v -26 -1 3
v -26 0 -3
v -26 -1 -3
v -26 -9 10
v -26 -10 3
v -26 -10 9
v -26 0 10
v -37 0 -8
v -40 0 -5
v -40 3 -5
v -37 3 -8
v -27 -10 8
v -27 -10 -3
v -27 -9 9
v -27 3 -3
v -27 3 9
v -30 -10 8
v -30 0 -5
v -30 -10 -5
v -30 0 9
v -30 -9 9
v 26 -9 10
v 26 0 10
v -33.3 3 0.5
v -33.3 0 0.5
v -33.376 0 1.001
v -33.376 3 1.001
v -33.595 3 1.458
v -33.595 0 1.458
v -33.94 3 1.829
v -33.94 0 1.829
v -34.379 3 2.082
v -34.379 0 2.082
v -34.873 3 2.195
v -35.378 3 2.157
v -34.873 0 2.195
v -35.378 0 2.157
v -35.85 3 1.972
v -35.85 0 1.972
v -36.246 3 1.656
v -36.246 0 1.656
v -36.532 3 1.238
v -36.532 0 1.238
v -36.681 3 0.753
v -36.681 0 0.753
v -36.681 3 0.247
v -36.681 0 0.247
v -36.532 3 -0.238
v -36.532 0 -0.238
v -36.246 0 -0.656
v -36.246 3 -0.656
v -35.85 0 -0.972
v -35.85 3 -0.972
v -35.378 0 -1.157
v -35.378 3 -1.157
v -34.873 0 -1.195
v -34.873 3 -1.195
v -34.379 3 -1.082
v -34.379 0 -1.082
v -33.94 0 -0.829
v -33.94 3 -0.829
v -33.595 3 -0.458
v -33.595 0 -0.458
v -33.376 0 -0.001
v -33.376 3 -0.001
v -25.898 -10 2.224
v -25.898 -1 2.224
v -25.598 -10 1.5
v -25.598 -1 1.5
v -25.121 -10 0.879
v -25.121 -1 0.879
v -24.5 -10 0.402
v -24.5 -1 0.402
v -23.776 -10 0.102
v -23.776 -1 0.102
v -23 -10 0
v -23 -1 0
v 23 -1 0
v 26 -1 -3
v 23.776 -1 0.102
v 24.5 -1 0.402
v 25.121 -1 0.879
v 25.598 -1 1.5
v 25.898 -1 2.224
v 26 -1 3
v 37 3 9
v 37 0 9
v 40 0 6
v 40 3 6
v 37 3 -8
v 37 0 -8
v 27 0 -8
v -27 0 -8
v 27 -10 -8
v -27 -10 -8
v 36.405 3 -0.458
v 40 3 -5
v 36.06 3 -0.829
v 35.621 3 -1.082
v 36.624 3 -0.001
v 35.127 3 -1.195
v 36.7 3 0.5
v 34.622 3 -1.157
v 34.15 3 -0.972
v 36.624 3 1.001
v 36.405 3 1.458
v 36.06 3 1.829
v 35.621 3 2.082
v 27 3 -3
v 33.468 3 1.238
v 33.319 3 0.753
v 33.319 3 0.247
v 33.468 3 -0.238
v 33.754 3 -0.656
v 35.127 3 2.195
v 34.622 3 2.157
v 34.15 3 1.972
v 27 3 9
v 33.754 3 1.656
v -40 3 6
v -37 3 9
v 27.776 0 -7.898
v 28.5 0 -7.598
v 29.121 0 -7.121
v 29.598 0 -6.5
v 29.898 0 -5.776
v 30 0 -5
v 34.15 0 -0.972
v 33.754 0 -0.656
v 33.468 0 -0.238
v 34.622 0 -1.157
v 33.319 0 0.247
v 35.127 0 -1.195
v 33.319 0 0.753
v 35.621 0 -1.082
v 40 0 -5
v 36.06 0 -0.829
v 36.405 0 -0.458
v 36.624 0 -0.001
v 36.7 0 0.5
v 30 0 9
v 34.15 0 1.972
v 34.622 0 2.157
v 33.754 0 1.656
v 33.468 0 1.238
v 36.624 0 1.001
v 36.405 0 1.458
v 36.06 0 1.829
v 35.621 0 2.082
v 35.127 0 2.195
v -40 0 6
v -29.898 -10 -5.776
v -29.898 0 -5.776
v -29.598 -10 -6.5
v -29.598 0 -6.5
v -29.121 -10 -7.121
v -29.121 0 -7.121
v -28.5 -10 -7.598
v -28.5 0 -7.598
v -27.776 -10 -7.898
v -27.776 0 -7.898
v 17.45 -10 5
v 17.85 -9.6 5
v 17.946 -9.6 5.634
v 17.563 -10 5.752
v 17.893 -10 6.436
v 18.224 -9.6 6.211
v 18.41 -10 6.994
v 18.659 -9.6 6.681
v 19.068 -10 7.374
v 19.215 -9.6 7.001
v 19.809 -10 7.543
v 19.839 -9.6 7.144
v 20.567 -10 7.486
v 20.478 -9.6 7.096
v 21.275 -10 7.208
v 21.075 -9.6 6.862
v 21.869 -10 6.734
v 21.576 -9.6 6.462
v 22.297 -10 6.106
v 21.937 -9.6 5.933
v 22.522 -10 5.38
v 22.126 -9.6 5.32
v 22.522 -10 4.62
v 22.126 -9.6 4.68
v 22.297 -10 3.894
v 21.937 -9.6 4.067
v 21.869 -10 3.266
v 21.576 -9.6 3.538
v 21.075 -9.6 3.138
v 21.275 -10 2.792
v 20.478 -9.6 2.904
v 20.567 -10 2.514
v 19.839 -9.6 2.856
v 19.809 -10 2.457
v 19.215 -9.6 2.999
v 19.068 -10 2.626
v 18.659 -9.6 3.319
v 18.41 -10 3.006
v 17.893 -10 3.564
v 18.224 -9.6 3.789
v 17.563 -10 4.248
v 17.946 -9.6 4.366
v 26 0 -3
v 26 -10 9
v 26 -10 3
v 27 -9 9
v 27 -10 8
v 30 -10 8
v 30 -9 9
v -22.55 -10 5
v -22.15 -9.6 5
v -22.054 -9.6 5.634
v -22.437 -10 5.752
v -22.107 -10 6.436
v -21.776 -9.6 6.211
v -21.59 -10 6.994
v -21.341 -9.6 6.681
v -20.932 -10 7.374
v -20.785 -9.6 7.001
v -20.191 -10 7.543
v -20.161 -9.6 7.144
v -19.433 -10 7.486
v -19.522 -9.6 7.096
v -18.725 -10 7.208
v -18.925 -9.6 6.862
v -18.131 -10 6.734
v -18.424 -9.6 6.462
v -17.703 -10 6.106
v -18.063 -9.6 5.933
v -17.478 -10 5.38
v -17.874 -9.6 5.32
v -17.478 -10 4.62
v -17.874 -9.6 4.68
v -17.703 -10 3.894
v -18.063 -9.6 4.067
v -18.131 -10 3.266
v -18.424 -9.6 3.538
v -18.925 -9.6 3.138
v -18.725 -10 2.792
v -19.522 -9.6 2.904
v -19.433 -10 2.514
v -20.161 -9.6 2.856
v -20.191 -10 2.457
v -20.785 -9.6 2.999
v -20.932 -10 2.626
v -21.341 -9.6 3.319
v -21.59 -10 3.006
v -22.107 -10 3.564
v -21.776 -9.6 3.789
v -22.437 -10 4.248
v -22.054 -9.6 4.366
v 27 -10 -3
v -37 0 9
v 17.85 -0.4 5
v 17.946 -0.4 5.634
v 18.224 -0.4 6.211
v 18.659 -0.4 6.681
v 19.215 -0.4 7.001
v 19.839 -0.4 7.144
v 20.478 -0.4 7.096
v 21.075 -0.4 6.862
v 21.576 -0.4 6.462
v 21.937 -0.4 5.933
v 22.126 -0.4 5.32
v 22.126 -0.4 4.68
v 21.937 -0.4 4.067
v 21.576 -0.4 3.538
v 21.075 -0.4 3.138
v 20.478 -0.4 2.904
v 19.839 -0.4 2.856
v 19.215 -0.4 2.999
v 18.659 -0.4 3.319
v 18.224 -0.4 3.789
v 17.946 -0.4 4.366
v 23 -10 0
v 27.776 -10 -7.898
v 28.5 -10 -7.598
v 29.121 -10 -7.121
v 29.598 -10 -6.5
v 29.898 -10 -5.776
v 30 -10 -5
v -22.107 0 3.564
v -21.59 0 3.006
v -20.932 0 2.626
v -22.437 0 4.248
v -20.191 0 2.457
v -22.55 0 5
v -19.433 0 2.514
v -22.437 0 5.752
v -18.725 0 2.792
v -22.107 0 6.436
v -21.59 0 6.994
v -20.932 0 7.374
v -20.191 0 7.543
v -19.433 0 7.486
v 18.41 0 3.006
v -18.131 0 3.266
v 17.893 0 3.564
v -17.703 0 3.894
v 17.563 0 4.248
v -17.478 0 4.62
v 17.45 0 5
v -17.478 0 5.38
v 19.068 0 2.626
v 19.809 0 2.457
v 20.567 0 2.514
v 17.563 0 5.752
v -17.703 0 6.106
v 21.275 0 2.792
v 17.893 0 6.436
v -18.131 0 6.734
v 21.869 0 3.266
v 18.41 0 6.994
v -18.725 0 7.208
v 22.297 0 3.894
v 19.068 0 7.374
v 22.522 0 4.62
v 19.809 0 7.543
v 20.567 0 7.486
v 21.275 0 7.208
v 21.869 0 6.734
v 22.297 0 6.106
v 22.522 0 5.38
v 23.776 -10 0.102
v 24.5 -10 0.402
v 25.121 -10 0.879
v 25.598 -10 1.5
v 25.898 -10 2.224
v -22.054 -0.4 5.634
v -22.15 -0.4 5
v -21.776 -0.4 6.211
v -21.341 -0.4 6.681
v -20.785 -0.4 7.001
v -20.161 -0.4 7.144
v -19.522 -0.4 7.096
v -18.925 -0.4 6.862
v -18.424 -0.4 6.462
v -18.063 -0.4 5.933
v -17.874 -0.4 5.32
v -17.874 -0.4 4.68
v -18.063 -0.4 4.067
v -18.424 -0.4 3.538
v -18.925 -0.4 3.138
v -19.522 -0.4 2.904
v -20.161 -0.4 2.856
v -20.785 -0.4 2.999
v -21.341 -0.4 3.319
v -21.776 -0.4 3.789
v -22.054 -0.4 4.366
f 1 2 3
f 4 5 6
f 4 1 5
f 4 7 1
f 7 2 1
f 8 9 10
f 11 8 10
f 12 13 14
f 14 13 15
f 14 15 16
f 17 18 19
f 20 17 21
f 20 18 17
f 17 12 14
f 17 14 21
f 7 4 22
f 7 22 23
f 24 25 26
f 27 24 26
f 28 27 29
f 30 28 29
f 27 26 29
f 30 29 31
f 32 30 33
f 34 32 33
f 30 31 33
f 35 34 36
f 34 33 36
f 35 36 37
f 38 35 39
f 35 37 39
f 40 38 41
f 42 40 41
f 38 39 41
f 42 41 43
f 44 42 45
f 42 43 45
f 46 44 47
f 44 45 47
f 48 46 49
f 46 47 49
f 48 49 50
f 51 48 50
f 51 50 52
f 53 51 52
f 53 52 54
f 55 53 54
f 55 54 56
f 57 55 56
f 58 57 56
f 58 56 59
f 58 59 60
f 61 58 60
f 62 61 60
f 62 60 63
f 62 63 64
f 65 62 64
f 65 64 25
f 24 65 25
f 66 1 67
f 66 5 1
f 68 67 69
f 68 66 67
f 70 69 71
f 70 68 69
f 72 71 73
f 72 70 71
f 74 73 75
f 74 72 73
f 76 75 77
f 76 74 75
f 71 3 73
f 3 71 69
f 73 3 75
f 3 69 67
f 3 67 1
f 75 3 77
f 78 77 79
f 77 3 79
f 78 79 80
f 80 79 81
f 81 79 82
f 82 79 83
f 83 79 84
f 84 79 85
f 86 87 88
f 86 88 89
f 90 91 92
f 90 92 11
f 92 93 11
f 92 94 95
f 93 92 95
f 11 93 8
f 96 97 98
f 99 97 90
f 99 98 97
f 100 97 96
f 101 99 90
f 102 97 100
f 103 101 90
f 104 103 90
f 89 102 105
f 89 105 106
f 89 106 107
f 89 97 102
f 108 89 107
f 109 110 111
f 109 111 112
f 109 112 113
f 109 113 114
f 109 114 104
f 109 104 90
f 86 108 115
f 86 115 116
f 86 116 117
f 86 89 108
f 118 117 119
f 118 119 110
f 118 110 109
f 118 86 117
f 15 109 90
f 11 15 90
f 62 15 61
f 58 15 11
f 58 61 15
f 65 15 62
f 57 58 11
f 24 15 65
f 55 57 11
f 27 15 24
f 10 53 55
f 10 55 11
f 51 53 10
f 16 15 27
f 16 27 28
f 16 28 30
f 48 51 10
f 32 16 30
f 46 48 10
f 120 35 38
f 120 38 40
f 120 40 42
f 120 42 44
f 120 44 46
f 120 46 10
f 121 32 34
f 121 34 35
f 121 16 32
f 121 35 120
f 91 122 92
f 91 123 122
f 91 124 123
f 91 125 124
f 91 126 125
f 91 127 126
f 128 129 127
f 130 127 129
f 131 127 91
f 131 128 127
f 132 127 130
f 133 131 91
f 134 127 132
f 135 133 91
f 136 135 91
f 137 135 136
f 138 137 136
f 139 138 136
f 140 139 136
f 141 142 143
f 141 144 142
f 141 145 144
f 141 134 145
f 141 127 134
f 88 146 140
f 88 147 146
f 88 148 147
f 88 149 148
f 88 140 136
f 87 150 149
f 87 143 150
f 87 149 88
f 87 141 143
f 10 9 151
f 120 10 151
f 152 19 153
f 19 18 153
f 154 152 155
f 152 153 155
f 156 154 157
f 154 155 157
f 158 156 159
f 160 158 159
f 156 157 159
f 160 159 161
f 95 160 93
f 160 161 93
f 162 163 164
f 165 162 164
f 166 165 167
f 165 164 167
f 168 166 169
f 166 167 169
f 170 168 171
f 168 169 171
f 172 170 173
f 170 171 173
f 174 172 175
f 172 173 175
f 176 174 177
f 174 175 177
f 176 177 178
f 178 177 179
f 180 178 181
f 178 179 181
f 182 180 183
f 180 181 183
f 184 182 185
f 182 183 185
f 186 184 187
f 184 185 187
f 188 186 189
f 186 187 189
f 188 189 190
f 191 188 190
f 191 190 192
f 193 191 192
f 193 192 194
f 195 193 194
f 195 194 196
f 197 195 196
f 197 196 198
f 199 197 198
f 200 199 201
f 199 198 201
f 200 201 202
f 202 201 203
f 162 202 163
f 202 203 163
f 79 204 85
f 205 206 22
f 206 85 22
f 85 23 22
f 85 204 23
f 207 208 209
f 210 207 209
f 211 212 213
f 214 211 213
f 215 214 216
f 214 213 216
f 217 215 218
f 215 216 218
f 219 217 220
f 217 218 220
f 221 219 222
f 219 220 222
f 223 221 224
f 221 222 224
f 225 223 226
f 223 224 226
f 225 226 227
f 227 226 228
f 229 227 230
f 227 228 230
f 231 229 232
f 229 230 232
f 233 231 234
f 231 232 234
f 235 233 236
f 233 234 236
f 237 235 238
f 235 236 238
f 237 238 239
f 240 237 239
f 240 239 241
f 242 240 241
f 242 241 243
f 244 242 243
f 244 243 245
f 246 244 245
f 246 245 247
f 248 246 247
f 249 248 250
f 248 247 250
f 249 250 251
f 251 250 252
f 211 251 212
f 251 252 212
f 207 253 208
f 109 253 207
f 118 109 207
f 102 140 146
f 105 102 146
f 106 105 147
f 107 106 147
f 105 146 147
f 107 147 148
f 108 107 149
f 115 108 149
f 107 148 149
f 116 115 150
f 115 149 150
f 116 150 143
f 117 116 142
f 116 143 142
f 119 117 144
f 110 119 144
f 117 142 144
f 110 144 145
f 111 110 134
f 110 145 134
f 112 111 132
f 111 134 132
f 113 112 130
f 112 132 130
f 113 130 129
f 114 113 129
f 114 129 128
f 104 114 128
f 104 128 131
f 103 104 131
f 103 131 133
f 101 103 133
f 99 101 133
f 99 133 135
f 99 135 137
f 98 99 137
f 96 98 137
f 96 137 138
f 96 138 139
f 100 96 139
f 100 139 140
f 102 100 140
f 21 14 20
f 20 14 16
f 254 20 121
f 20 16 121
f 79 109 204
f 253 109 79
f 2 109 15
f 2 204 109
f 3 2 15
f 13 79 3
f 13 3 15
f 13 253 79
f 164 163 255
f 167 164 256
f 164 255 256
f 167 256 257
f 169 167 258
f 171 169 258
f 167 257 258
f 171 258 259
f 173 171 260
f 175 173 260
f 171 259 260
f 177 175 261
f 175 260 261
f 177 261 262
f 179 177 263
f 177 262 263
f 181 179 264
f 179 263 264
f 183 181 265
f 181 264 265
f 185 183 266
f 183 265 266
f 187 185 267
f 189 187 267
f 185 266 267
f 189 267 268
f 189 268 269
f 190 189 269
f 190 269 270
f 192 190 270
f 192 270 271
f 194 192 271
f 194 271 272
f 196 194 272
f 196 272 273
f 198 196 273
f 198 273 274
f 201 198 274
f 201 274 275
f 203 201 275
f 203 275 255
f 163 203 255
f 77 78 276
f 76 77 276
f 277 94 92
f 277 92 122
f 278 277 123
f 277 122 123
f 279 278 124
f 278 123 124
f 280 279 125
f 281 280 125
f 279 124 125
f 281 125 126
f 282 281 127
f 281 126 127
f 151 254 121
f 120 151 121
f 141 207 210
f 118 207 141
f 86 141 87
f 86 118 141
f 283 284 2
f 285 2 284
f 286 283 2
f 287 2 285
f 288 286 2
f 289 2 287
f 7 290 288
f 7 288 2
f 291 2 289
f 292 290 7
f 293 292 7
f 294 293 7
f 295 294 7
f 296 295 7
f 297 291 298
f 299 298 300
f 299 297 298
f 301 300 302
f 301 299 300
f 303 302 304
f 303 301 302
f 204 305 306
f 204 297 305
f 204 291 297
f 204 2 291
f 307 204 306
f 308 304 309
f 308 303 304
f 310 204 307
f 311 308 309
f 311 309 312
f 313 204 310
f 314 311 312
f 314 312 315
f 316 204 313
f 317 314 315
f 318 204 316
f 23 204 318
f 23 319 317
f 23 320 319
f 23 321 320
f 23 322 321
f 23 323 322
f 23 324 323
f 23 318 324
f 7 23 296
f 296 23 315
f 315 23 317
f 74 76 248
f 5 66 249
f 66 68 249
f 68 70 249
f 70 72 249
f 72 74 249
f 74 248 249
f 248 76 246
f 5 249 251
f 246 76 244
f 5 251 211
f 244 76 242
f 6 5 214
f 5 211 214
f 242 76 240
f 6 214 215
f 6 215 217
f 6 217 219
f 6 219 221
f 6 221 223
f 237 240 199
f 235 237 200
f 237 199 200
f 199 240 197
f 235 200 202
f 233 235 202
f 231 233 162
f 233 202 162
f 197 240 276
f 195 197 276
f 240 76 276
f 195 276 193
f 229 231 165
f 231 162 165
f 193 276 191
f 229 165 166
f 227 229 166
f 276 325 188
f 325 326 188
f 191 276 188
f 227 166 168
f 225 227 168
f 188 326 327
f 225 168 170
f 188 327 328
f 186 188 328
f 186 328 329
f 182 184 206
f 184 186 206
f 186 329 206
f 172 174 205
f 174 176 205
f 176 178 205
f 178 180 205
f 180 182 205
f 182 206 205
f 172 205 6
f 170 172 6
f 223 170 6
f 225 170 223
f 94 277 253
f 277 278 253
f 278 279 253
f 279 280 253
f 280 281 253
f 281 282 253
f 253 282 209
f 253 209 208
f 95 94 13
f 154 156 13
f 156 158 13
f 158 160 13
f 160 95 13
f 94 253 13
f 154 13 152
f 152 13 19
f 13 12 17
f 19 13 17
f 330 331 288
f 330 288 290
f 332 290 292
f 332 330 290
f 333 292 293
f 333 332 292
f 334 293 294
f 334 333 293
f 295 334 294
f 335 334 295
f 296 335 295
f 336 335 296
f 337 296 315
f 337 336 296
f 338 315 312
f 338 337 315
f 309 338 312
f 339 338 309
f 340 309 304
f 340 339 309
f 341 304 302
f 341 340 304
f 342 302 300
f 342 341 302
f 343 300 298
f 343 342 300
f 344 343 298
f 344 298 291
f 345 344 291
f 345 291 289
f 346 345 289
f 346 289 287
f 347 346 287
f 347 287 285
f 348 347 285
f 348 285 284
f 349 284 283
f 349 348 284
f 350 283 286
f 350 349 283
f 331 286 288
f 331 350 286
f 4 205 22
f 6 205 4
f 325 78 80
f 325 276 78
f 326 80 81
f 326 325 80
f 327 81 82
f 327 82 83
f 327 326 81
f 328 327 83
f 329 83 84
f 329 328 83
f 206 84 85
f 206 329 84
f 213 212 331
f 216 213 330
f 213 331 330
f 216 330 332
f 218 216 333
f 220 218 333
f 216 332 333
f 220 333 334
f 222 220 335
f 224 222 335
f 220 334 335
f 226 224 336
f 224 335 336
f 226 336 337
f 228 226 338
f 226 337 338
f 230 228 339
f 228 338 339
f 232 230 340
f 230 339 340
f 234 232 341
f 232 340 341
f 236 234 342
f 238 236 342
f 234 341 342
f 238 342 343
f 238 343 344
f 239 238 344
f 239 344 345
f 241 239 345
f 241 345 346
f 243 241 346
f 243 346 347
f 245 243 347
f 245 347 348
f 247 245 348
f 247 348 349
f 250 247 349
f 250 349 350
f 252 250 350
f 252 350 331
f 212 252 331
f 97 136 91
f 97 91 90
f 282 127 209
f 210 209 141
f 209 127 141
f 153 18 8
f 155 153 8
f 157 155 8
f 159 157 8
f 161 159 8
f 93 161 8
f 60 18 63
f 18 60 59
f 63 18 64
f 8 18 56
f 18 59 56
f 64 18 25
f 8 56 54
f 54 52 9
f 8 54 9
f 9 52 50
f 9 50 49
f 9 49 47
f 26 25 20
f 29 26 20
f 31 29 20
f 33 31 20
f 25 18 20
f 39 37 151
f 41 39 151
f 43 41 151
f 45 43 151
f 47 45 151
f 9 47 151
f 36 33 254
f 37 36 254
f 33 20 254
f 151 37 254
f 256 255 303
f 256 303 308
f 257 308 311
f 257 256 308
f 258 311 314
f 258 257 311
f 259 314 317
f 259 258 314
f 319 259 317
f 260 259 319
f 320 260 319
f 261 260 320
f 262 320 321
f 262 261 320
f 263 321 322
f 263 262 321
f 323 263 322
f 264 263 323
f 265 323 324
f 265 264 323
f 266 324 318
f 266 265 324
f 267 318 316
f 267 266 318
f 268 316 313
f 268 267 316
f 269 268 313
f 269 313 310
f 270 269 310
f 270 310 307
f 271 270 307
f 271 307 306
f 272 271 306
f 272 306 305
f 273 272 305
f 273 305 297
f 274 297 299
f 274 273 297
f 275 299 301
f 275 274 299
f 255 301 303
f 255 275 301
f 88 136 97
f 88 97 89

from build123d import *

# Parameters (mm, degrees)
PAD062_DEPTH    = 30
SKETCH125_W     = 10
SKETCH125_H     = 13
POCKET062_DEPTH = 4
SKETCH126_W     = 60
SKETCH126_H     = 5
PAD063_DEPTH    = 3
SKETCH127_W     = 13
SKETCH127_H     = 17
PAD064_DEPTH    = 3
SKETCH128_W     = 3
SKETCH128_H     = 12
PAD065_DEPTH    = 10
SKETCH129_R     = 1.7
POCKET063_DEPTH = 5
CHAMFER046_SIZE = 3
FILLET045_R     = 3
FILLET046_R     = 3
CHAMFER047_SIZE = 1
SKETCH130_R     = 2.15
POCKET064_DEPTH = 10.001
CHAMFER048_SIZE = 0.4


with BuildPart() as part:
    # Sketch124 → Pad062 (new body, symmetric)
    with BuildSketch(Plane.YZ):
        Polygon((-10, 0), (-10, 10), (0, 10), (0, 0), (0, -3), (0, -8), (-10, -8), (-10, -3), (-1, -3), (-1, 0), align=None)
    extrude(amount=PAD062_DEPTH, both=True)

    # Sketch125 (on Face8 of Pad062) → Pocket062 (cut)
    with BuildSketch(Plane(origin=(-30, 0, 0), x_dir=(0, -1, 0), z_dir=(-1, 0, 0))):
        with Locations((5, 3.5)):
            Rectangle(SKETCH125_W, SKETCH125_H)
    pocket062 = extrude(amount=-POCKET062_DEPTH, mode=Mode.SUBTRACT)

    # Mirrored009: Pocket062 across YZ
    add(pocket062.mirror(Plane.YZ), mode=Mode.SUBTRACT)

    # Sketch126 (on Face6 of Mirrored009) → Pad063 (join)
    with BuildSketch(Plane(origin=(0, 0, 0), x_dir=(-1, 0, 0), z_dir=(0, 1, 0))):
        with Locations((0, -5.5)):
            Rectangle(SKETCH126_W, SKETCH126_H)
    extrude(amount=PAD063_DEPTH)

    # Sketch127 → Pad064 (join)
    with BuildSketch(Plane.XZ):
        with Locations((33.5, 0.5)):
            Rectangle(SKETCH127_W, SKETCH127_H)
    pad064 = extrude(amount=-PAD064_DEPTH)

    # Sketch128 (on Face6 of Pad064) → Pad065 (join)
    with BuildSketch(Plane.XZ):
        with Locations((28.5, 3)):
            Rectangle(SKETCH128_W, SKETCH128_H)
    pad065 = extrude(amount=PAD065_DEPTH)

    # Mirrored010: Pad064, Pad065 across Sketch127 V_Axis
    add(pad064.mirror(Plane(origin=(0, 0, 0), x_dir=(0, -1, 0), z_dir=(1, 0, 0))))
    add(pad065.mirror(Plane(origin=(0, 0, 0), x_dir=(0, -1, 0), z_dir=(1, 0, 0))))

    # Sketch129 → Pocket063 (cut)
    with BuildSketch(Plane.XZ):
        with Locations((-35, 0.5)):
            Circle(SKETCH129_R)
        with Locations((35, 0.5)):
            Circle(SKETCH129_R)
    extrude(amount=-POCKET063_DEPTH, mode=Mode.SUBTRACT)

    # Chamfer046
    chamfer046_edges = [part.edges().sort_by_distance(p)[0] for p in [
        (-40, 1.5, 9),
        (-40, 1.5, -8),
        (40, 1.5, -8),
        (40, 1.5, 9),
    ]]
    chamfer(chamfer046_edges, length=CHAMFER046_SIZE)

    # Fillet045
    fillet045_edges = [part.edges().sort_by_distance(p)[0] for p in [
        (-30, -5, -8),
        (30, -5, -8),
    ]]
    fillet(fillet045_edges, radius=FILLET045_R)

    # Fillet046
    fillet046_edges = [part.edges().sort_by_distance(p)[0] for p in [
        (26, -5.5, 0),
        (-26, -5.5, 0),
    ]]
    fillet(fillet046_edges, radius=FILLET046_R)

    # Chamfer047
    chamfer047_edges = [part.edges().sort_by_distance(p)[0] for p in [
        (-28.5, -10, 9),
        (28.5, -10, 9),
        (0, -10, 10),
    ]]
    chamfer(chamfer047_edges, length=CHAMFER047_SIZE)

    # Sketch130 (on Face7 of Chamfer047) → Pocket064 (cut, through all)
    with BuildSketch(Plane(origin=(0, 0, 0), x_dir=(-1, 0, 0), z_dir=(0, 1, 0))):
        with Locations((-20, 5)):
            Circle(SKETCH130_R)
        with Locations((20, 5)):
            Circle(SKETCH130_R)
    extrude(amount=-POCKET064_DEPTH, mode=Mode.SUBTRACT)

    # Chamfer048
    chamfer048_edges = [part.edges().sort_by_distance(p)[0] for p in [
        (-17.85, -10, 5),
        (-17.85, 0, 5),
        (22.15, -10, 5),
        (22.15, 0, 5),
    ]]
    chamfer(chamfer048_edges, length=CHAMFER048_SIZE)


solid = part.part
